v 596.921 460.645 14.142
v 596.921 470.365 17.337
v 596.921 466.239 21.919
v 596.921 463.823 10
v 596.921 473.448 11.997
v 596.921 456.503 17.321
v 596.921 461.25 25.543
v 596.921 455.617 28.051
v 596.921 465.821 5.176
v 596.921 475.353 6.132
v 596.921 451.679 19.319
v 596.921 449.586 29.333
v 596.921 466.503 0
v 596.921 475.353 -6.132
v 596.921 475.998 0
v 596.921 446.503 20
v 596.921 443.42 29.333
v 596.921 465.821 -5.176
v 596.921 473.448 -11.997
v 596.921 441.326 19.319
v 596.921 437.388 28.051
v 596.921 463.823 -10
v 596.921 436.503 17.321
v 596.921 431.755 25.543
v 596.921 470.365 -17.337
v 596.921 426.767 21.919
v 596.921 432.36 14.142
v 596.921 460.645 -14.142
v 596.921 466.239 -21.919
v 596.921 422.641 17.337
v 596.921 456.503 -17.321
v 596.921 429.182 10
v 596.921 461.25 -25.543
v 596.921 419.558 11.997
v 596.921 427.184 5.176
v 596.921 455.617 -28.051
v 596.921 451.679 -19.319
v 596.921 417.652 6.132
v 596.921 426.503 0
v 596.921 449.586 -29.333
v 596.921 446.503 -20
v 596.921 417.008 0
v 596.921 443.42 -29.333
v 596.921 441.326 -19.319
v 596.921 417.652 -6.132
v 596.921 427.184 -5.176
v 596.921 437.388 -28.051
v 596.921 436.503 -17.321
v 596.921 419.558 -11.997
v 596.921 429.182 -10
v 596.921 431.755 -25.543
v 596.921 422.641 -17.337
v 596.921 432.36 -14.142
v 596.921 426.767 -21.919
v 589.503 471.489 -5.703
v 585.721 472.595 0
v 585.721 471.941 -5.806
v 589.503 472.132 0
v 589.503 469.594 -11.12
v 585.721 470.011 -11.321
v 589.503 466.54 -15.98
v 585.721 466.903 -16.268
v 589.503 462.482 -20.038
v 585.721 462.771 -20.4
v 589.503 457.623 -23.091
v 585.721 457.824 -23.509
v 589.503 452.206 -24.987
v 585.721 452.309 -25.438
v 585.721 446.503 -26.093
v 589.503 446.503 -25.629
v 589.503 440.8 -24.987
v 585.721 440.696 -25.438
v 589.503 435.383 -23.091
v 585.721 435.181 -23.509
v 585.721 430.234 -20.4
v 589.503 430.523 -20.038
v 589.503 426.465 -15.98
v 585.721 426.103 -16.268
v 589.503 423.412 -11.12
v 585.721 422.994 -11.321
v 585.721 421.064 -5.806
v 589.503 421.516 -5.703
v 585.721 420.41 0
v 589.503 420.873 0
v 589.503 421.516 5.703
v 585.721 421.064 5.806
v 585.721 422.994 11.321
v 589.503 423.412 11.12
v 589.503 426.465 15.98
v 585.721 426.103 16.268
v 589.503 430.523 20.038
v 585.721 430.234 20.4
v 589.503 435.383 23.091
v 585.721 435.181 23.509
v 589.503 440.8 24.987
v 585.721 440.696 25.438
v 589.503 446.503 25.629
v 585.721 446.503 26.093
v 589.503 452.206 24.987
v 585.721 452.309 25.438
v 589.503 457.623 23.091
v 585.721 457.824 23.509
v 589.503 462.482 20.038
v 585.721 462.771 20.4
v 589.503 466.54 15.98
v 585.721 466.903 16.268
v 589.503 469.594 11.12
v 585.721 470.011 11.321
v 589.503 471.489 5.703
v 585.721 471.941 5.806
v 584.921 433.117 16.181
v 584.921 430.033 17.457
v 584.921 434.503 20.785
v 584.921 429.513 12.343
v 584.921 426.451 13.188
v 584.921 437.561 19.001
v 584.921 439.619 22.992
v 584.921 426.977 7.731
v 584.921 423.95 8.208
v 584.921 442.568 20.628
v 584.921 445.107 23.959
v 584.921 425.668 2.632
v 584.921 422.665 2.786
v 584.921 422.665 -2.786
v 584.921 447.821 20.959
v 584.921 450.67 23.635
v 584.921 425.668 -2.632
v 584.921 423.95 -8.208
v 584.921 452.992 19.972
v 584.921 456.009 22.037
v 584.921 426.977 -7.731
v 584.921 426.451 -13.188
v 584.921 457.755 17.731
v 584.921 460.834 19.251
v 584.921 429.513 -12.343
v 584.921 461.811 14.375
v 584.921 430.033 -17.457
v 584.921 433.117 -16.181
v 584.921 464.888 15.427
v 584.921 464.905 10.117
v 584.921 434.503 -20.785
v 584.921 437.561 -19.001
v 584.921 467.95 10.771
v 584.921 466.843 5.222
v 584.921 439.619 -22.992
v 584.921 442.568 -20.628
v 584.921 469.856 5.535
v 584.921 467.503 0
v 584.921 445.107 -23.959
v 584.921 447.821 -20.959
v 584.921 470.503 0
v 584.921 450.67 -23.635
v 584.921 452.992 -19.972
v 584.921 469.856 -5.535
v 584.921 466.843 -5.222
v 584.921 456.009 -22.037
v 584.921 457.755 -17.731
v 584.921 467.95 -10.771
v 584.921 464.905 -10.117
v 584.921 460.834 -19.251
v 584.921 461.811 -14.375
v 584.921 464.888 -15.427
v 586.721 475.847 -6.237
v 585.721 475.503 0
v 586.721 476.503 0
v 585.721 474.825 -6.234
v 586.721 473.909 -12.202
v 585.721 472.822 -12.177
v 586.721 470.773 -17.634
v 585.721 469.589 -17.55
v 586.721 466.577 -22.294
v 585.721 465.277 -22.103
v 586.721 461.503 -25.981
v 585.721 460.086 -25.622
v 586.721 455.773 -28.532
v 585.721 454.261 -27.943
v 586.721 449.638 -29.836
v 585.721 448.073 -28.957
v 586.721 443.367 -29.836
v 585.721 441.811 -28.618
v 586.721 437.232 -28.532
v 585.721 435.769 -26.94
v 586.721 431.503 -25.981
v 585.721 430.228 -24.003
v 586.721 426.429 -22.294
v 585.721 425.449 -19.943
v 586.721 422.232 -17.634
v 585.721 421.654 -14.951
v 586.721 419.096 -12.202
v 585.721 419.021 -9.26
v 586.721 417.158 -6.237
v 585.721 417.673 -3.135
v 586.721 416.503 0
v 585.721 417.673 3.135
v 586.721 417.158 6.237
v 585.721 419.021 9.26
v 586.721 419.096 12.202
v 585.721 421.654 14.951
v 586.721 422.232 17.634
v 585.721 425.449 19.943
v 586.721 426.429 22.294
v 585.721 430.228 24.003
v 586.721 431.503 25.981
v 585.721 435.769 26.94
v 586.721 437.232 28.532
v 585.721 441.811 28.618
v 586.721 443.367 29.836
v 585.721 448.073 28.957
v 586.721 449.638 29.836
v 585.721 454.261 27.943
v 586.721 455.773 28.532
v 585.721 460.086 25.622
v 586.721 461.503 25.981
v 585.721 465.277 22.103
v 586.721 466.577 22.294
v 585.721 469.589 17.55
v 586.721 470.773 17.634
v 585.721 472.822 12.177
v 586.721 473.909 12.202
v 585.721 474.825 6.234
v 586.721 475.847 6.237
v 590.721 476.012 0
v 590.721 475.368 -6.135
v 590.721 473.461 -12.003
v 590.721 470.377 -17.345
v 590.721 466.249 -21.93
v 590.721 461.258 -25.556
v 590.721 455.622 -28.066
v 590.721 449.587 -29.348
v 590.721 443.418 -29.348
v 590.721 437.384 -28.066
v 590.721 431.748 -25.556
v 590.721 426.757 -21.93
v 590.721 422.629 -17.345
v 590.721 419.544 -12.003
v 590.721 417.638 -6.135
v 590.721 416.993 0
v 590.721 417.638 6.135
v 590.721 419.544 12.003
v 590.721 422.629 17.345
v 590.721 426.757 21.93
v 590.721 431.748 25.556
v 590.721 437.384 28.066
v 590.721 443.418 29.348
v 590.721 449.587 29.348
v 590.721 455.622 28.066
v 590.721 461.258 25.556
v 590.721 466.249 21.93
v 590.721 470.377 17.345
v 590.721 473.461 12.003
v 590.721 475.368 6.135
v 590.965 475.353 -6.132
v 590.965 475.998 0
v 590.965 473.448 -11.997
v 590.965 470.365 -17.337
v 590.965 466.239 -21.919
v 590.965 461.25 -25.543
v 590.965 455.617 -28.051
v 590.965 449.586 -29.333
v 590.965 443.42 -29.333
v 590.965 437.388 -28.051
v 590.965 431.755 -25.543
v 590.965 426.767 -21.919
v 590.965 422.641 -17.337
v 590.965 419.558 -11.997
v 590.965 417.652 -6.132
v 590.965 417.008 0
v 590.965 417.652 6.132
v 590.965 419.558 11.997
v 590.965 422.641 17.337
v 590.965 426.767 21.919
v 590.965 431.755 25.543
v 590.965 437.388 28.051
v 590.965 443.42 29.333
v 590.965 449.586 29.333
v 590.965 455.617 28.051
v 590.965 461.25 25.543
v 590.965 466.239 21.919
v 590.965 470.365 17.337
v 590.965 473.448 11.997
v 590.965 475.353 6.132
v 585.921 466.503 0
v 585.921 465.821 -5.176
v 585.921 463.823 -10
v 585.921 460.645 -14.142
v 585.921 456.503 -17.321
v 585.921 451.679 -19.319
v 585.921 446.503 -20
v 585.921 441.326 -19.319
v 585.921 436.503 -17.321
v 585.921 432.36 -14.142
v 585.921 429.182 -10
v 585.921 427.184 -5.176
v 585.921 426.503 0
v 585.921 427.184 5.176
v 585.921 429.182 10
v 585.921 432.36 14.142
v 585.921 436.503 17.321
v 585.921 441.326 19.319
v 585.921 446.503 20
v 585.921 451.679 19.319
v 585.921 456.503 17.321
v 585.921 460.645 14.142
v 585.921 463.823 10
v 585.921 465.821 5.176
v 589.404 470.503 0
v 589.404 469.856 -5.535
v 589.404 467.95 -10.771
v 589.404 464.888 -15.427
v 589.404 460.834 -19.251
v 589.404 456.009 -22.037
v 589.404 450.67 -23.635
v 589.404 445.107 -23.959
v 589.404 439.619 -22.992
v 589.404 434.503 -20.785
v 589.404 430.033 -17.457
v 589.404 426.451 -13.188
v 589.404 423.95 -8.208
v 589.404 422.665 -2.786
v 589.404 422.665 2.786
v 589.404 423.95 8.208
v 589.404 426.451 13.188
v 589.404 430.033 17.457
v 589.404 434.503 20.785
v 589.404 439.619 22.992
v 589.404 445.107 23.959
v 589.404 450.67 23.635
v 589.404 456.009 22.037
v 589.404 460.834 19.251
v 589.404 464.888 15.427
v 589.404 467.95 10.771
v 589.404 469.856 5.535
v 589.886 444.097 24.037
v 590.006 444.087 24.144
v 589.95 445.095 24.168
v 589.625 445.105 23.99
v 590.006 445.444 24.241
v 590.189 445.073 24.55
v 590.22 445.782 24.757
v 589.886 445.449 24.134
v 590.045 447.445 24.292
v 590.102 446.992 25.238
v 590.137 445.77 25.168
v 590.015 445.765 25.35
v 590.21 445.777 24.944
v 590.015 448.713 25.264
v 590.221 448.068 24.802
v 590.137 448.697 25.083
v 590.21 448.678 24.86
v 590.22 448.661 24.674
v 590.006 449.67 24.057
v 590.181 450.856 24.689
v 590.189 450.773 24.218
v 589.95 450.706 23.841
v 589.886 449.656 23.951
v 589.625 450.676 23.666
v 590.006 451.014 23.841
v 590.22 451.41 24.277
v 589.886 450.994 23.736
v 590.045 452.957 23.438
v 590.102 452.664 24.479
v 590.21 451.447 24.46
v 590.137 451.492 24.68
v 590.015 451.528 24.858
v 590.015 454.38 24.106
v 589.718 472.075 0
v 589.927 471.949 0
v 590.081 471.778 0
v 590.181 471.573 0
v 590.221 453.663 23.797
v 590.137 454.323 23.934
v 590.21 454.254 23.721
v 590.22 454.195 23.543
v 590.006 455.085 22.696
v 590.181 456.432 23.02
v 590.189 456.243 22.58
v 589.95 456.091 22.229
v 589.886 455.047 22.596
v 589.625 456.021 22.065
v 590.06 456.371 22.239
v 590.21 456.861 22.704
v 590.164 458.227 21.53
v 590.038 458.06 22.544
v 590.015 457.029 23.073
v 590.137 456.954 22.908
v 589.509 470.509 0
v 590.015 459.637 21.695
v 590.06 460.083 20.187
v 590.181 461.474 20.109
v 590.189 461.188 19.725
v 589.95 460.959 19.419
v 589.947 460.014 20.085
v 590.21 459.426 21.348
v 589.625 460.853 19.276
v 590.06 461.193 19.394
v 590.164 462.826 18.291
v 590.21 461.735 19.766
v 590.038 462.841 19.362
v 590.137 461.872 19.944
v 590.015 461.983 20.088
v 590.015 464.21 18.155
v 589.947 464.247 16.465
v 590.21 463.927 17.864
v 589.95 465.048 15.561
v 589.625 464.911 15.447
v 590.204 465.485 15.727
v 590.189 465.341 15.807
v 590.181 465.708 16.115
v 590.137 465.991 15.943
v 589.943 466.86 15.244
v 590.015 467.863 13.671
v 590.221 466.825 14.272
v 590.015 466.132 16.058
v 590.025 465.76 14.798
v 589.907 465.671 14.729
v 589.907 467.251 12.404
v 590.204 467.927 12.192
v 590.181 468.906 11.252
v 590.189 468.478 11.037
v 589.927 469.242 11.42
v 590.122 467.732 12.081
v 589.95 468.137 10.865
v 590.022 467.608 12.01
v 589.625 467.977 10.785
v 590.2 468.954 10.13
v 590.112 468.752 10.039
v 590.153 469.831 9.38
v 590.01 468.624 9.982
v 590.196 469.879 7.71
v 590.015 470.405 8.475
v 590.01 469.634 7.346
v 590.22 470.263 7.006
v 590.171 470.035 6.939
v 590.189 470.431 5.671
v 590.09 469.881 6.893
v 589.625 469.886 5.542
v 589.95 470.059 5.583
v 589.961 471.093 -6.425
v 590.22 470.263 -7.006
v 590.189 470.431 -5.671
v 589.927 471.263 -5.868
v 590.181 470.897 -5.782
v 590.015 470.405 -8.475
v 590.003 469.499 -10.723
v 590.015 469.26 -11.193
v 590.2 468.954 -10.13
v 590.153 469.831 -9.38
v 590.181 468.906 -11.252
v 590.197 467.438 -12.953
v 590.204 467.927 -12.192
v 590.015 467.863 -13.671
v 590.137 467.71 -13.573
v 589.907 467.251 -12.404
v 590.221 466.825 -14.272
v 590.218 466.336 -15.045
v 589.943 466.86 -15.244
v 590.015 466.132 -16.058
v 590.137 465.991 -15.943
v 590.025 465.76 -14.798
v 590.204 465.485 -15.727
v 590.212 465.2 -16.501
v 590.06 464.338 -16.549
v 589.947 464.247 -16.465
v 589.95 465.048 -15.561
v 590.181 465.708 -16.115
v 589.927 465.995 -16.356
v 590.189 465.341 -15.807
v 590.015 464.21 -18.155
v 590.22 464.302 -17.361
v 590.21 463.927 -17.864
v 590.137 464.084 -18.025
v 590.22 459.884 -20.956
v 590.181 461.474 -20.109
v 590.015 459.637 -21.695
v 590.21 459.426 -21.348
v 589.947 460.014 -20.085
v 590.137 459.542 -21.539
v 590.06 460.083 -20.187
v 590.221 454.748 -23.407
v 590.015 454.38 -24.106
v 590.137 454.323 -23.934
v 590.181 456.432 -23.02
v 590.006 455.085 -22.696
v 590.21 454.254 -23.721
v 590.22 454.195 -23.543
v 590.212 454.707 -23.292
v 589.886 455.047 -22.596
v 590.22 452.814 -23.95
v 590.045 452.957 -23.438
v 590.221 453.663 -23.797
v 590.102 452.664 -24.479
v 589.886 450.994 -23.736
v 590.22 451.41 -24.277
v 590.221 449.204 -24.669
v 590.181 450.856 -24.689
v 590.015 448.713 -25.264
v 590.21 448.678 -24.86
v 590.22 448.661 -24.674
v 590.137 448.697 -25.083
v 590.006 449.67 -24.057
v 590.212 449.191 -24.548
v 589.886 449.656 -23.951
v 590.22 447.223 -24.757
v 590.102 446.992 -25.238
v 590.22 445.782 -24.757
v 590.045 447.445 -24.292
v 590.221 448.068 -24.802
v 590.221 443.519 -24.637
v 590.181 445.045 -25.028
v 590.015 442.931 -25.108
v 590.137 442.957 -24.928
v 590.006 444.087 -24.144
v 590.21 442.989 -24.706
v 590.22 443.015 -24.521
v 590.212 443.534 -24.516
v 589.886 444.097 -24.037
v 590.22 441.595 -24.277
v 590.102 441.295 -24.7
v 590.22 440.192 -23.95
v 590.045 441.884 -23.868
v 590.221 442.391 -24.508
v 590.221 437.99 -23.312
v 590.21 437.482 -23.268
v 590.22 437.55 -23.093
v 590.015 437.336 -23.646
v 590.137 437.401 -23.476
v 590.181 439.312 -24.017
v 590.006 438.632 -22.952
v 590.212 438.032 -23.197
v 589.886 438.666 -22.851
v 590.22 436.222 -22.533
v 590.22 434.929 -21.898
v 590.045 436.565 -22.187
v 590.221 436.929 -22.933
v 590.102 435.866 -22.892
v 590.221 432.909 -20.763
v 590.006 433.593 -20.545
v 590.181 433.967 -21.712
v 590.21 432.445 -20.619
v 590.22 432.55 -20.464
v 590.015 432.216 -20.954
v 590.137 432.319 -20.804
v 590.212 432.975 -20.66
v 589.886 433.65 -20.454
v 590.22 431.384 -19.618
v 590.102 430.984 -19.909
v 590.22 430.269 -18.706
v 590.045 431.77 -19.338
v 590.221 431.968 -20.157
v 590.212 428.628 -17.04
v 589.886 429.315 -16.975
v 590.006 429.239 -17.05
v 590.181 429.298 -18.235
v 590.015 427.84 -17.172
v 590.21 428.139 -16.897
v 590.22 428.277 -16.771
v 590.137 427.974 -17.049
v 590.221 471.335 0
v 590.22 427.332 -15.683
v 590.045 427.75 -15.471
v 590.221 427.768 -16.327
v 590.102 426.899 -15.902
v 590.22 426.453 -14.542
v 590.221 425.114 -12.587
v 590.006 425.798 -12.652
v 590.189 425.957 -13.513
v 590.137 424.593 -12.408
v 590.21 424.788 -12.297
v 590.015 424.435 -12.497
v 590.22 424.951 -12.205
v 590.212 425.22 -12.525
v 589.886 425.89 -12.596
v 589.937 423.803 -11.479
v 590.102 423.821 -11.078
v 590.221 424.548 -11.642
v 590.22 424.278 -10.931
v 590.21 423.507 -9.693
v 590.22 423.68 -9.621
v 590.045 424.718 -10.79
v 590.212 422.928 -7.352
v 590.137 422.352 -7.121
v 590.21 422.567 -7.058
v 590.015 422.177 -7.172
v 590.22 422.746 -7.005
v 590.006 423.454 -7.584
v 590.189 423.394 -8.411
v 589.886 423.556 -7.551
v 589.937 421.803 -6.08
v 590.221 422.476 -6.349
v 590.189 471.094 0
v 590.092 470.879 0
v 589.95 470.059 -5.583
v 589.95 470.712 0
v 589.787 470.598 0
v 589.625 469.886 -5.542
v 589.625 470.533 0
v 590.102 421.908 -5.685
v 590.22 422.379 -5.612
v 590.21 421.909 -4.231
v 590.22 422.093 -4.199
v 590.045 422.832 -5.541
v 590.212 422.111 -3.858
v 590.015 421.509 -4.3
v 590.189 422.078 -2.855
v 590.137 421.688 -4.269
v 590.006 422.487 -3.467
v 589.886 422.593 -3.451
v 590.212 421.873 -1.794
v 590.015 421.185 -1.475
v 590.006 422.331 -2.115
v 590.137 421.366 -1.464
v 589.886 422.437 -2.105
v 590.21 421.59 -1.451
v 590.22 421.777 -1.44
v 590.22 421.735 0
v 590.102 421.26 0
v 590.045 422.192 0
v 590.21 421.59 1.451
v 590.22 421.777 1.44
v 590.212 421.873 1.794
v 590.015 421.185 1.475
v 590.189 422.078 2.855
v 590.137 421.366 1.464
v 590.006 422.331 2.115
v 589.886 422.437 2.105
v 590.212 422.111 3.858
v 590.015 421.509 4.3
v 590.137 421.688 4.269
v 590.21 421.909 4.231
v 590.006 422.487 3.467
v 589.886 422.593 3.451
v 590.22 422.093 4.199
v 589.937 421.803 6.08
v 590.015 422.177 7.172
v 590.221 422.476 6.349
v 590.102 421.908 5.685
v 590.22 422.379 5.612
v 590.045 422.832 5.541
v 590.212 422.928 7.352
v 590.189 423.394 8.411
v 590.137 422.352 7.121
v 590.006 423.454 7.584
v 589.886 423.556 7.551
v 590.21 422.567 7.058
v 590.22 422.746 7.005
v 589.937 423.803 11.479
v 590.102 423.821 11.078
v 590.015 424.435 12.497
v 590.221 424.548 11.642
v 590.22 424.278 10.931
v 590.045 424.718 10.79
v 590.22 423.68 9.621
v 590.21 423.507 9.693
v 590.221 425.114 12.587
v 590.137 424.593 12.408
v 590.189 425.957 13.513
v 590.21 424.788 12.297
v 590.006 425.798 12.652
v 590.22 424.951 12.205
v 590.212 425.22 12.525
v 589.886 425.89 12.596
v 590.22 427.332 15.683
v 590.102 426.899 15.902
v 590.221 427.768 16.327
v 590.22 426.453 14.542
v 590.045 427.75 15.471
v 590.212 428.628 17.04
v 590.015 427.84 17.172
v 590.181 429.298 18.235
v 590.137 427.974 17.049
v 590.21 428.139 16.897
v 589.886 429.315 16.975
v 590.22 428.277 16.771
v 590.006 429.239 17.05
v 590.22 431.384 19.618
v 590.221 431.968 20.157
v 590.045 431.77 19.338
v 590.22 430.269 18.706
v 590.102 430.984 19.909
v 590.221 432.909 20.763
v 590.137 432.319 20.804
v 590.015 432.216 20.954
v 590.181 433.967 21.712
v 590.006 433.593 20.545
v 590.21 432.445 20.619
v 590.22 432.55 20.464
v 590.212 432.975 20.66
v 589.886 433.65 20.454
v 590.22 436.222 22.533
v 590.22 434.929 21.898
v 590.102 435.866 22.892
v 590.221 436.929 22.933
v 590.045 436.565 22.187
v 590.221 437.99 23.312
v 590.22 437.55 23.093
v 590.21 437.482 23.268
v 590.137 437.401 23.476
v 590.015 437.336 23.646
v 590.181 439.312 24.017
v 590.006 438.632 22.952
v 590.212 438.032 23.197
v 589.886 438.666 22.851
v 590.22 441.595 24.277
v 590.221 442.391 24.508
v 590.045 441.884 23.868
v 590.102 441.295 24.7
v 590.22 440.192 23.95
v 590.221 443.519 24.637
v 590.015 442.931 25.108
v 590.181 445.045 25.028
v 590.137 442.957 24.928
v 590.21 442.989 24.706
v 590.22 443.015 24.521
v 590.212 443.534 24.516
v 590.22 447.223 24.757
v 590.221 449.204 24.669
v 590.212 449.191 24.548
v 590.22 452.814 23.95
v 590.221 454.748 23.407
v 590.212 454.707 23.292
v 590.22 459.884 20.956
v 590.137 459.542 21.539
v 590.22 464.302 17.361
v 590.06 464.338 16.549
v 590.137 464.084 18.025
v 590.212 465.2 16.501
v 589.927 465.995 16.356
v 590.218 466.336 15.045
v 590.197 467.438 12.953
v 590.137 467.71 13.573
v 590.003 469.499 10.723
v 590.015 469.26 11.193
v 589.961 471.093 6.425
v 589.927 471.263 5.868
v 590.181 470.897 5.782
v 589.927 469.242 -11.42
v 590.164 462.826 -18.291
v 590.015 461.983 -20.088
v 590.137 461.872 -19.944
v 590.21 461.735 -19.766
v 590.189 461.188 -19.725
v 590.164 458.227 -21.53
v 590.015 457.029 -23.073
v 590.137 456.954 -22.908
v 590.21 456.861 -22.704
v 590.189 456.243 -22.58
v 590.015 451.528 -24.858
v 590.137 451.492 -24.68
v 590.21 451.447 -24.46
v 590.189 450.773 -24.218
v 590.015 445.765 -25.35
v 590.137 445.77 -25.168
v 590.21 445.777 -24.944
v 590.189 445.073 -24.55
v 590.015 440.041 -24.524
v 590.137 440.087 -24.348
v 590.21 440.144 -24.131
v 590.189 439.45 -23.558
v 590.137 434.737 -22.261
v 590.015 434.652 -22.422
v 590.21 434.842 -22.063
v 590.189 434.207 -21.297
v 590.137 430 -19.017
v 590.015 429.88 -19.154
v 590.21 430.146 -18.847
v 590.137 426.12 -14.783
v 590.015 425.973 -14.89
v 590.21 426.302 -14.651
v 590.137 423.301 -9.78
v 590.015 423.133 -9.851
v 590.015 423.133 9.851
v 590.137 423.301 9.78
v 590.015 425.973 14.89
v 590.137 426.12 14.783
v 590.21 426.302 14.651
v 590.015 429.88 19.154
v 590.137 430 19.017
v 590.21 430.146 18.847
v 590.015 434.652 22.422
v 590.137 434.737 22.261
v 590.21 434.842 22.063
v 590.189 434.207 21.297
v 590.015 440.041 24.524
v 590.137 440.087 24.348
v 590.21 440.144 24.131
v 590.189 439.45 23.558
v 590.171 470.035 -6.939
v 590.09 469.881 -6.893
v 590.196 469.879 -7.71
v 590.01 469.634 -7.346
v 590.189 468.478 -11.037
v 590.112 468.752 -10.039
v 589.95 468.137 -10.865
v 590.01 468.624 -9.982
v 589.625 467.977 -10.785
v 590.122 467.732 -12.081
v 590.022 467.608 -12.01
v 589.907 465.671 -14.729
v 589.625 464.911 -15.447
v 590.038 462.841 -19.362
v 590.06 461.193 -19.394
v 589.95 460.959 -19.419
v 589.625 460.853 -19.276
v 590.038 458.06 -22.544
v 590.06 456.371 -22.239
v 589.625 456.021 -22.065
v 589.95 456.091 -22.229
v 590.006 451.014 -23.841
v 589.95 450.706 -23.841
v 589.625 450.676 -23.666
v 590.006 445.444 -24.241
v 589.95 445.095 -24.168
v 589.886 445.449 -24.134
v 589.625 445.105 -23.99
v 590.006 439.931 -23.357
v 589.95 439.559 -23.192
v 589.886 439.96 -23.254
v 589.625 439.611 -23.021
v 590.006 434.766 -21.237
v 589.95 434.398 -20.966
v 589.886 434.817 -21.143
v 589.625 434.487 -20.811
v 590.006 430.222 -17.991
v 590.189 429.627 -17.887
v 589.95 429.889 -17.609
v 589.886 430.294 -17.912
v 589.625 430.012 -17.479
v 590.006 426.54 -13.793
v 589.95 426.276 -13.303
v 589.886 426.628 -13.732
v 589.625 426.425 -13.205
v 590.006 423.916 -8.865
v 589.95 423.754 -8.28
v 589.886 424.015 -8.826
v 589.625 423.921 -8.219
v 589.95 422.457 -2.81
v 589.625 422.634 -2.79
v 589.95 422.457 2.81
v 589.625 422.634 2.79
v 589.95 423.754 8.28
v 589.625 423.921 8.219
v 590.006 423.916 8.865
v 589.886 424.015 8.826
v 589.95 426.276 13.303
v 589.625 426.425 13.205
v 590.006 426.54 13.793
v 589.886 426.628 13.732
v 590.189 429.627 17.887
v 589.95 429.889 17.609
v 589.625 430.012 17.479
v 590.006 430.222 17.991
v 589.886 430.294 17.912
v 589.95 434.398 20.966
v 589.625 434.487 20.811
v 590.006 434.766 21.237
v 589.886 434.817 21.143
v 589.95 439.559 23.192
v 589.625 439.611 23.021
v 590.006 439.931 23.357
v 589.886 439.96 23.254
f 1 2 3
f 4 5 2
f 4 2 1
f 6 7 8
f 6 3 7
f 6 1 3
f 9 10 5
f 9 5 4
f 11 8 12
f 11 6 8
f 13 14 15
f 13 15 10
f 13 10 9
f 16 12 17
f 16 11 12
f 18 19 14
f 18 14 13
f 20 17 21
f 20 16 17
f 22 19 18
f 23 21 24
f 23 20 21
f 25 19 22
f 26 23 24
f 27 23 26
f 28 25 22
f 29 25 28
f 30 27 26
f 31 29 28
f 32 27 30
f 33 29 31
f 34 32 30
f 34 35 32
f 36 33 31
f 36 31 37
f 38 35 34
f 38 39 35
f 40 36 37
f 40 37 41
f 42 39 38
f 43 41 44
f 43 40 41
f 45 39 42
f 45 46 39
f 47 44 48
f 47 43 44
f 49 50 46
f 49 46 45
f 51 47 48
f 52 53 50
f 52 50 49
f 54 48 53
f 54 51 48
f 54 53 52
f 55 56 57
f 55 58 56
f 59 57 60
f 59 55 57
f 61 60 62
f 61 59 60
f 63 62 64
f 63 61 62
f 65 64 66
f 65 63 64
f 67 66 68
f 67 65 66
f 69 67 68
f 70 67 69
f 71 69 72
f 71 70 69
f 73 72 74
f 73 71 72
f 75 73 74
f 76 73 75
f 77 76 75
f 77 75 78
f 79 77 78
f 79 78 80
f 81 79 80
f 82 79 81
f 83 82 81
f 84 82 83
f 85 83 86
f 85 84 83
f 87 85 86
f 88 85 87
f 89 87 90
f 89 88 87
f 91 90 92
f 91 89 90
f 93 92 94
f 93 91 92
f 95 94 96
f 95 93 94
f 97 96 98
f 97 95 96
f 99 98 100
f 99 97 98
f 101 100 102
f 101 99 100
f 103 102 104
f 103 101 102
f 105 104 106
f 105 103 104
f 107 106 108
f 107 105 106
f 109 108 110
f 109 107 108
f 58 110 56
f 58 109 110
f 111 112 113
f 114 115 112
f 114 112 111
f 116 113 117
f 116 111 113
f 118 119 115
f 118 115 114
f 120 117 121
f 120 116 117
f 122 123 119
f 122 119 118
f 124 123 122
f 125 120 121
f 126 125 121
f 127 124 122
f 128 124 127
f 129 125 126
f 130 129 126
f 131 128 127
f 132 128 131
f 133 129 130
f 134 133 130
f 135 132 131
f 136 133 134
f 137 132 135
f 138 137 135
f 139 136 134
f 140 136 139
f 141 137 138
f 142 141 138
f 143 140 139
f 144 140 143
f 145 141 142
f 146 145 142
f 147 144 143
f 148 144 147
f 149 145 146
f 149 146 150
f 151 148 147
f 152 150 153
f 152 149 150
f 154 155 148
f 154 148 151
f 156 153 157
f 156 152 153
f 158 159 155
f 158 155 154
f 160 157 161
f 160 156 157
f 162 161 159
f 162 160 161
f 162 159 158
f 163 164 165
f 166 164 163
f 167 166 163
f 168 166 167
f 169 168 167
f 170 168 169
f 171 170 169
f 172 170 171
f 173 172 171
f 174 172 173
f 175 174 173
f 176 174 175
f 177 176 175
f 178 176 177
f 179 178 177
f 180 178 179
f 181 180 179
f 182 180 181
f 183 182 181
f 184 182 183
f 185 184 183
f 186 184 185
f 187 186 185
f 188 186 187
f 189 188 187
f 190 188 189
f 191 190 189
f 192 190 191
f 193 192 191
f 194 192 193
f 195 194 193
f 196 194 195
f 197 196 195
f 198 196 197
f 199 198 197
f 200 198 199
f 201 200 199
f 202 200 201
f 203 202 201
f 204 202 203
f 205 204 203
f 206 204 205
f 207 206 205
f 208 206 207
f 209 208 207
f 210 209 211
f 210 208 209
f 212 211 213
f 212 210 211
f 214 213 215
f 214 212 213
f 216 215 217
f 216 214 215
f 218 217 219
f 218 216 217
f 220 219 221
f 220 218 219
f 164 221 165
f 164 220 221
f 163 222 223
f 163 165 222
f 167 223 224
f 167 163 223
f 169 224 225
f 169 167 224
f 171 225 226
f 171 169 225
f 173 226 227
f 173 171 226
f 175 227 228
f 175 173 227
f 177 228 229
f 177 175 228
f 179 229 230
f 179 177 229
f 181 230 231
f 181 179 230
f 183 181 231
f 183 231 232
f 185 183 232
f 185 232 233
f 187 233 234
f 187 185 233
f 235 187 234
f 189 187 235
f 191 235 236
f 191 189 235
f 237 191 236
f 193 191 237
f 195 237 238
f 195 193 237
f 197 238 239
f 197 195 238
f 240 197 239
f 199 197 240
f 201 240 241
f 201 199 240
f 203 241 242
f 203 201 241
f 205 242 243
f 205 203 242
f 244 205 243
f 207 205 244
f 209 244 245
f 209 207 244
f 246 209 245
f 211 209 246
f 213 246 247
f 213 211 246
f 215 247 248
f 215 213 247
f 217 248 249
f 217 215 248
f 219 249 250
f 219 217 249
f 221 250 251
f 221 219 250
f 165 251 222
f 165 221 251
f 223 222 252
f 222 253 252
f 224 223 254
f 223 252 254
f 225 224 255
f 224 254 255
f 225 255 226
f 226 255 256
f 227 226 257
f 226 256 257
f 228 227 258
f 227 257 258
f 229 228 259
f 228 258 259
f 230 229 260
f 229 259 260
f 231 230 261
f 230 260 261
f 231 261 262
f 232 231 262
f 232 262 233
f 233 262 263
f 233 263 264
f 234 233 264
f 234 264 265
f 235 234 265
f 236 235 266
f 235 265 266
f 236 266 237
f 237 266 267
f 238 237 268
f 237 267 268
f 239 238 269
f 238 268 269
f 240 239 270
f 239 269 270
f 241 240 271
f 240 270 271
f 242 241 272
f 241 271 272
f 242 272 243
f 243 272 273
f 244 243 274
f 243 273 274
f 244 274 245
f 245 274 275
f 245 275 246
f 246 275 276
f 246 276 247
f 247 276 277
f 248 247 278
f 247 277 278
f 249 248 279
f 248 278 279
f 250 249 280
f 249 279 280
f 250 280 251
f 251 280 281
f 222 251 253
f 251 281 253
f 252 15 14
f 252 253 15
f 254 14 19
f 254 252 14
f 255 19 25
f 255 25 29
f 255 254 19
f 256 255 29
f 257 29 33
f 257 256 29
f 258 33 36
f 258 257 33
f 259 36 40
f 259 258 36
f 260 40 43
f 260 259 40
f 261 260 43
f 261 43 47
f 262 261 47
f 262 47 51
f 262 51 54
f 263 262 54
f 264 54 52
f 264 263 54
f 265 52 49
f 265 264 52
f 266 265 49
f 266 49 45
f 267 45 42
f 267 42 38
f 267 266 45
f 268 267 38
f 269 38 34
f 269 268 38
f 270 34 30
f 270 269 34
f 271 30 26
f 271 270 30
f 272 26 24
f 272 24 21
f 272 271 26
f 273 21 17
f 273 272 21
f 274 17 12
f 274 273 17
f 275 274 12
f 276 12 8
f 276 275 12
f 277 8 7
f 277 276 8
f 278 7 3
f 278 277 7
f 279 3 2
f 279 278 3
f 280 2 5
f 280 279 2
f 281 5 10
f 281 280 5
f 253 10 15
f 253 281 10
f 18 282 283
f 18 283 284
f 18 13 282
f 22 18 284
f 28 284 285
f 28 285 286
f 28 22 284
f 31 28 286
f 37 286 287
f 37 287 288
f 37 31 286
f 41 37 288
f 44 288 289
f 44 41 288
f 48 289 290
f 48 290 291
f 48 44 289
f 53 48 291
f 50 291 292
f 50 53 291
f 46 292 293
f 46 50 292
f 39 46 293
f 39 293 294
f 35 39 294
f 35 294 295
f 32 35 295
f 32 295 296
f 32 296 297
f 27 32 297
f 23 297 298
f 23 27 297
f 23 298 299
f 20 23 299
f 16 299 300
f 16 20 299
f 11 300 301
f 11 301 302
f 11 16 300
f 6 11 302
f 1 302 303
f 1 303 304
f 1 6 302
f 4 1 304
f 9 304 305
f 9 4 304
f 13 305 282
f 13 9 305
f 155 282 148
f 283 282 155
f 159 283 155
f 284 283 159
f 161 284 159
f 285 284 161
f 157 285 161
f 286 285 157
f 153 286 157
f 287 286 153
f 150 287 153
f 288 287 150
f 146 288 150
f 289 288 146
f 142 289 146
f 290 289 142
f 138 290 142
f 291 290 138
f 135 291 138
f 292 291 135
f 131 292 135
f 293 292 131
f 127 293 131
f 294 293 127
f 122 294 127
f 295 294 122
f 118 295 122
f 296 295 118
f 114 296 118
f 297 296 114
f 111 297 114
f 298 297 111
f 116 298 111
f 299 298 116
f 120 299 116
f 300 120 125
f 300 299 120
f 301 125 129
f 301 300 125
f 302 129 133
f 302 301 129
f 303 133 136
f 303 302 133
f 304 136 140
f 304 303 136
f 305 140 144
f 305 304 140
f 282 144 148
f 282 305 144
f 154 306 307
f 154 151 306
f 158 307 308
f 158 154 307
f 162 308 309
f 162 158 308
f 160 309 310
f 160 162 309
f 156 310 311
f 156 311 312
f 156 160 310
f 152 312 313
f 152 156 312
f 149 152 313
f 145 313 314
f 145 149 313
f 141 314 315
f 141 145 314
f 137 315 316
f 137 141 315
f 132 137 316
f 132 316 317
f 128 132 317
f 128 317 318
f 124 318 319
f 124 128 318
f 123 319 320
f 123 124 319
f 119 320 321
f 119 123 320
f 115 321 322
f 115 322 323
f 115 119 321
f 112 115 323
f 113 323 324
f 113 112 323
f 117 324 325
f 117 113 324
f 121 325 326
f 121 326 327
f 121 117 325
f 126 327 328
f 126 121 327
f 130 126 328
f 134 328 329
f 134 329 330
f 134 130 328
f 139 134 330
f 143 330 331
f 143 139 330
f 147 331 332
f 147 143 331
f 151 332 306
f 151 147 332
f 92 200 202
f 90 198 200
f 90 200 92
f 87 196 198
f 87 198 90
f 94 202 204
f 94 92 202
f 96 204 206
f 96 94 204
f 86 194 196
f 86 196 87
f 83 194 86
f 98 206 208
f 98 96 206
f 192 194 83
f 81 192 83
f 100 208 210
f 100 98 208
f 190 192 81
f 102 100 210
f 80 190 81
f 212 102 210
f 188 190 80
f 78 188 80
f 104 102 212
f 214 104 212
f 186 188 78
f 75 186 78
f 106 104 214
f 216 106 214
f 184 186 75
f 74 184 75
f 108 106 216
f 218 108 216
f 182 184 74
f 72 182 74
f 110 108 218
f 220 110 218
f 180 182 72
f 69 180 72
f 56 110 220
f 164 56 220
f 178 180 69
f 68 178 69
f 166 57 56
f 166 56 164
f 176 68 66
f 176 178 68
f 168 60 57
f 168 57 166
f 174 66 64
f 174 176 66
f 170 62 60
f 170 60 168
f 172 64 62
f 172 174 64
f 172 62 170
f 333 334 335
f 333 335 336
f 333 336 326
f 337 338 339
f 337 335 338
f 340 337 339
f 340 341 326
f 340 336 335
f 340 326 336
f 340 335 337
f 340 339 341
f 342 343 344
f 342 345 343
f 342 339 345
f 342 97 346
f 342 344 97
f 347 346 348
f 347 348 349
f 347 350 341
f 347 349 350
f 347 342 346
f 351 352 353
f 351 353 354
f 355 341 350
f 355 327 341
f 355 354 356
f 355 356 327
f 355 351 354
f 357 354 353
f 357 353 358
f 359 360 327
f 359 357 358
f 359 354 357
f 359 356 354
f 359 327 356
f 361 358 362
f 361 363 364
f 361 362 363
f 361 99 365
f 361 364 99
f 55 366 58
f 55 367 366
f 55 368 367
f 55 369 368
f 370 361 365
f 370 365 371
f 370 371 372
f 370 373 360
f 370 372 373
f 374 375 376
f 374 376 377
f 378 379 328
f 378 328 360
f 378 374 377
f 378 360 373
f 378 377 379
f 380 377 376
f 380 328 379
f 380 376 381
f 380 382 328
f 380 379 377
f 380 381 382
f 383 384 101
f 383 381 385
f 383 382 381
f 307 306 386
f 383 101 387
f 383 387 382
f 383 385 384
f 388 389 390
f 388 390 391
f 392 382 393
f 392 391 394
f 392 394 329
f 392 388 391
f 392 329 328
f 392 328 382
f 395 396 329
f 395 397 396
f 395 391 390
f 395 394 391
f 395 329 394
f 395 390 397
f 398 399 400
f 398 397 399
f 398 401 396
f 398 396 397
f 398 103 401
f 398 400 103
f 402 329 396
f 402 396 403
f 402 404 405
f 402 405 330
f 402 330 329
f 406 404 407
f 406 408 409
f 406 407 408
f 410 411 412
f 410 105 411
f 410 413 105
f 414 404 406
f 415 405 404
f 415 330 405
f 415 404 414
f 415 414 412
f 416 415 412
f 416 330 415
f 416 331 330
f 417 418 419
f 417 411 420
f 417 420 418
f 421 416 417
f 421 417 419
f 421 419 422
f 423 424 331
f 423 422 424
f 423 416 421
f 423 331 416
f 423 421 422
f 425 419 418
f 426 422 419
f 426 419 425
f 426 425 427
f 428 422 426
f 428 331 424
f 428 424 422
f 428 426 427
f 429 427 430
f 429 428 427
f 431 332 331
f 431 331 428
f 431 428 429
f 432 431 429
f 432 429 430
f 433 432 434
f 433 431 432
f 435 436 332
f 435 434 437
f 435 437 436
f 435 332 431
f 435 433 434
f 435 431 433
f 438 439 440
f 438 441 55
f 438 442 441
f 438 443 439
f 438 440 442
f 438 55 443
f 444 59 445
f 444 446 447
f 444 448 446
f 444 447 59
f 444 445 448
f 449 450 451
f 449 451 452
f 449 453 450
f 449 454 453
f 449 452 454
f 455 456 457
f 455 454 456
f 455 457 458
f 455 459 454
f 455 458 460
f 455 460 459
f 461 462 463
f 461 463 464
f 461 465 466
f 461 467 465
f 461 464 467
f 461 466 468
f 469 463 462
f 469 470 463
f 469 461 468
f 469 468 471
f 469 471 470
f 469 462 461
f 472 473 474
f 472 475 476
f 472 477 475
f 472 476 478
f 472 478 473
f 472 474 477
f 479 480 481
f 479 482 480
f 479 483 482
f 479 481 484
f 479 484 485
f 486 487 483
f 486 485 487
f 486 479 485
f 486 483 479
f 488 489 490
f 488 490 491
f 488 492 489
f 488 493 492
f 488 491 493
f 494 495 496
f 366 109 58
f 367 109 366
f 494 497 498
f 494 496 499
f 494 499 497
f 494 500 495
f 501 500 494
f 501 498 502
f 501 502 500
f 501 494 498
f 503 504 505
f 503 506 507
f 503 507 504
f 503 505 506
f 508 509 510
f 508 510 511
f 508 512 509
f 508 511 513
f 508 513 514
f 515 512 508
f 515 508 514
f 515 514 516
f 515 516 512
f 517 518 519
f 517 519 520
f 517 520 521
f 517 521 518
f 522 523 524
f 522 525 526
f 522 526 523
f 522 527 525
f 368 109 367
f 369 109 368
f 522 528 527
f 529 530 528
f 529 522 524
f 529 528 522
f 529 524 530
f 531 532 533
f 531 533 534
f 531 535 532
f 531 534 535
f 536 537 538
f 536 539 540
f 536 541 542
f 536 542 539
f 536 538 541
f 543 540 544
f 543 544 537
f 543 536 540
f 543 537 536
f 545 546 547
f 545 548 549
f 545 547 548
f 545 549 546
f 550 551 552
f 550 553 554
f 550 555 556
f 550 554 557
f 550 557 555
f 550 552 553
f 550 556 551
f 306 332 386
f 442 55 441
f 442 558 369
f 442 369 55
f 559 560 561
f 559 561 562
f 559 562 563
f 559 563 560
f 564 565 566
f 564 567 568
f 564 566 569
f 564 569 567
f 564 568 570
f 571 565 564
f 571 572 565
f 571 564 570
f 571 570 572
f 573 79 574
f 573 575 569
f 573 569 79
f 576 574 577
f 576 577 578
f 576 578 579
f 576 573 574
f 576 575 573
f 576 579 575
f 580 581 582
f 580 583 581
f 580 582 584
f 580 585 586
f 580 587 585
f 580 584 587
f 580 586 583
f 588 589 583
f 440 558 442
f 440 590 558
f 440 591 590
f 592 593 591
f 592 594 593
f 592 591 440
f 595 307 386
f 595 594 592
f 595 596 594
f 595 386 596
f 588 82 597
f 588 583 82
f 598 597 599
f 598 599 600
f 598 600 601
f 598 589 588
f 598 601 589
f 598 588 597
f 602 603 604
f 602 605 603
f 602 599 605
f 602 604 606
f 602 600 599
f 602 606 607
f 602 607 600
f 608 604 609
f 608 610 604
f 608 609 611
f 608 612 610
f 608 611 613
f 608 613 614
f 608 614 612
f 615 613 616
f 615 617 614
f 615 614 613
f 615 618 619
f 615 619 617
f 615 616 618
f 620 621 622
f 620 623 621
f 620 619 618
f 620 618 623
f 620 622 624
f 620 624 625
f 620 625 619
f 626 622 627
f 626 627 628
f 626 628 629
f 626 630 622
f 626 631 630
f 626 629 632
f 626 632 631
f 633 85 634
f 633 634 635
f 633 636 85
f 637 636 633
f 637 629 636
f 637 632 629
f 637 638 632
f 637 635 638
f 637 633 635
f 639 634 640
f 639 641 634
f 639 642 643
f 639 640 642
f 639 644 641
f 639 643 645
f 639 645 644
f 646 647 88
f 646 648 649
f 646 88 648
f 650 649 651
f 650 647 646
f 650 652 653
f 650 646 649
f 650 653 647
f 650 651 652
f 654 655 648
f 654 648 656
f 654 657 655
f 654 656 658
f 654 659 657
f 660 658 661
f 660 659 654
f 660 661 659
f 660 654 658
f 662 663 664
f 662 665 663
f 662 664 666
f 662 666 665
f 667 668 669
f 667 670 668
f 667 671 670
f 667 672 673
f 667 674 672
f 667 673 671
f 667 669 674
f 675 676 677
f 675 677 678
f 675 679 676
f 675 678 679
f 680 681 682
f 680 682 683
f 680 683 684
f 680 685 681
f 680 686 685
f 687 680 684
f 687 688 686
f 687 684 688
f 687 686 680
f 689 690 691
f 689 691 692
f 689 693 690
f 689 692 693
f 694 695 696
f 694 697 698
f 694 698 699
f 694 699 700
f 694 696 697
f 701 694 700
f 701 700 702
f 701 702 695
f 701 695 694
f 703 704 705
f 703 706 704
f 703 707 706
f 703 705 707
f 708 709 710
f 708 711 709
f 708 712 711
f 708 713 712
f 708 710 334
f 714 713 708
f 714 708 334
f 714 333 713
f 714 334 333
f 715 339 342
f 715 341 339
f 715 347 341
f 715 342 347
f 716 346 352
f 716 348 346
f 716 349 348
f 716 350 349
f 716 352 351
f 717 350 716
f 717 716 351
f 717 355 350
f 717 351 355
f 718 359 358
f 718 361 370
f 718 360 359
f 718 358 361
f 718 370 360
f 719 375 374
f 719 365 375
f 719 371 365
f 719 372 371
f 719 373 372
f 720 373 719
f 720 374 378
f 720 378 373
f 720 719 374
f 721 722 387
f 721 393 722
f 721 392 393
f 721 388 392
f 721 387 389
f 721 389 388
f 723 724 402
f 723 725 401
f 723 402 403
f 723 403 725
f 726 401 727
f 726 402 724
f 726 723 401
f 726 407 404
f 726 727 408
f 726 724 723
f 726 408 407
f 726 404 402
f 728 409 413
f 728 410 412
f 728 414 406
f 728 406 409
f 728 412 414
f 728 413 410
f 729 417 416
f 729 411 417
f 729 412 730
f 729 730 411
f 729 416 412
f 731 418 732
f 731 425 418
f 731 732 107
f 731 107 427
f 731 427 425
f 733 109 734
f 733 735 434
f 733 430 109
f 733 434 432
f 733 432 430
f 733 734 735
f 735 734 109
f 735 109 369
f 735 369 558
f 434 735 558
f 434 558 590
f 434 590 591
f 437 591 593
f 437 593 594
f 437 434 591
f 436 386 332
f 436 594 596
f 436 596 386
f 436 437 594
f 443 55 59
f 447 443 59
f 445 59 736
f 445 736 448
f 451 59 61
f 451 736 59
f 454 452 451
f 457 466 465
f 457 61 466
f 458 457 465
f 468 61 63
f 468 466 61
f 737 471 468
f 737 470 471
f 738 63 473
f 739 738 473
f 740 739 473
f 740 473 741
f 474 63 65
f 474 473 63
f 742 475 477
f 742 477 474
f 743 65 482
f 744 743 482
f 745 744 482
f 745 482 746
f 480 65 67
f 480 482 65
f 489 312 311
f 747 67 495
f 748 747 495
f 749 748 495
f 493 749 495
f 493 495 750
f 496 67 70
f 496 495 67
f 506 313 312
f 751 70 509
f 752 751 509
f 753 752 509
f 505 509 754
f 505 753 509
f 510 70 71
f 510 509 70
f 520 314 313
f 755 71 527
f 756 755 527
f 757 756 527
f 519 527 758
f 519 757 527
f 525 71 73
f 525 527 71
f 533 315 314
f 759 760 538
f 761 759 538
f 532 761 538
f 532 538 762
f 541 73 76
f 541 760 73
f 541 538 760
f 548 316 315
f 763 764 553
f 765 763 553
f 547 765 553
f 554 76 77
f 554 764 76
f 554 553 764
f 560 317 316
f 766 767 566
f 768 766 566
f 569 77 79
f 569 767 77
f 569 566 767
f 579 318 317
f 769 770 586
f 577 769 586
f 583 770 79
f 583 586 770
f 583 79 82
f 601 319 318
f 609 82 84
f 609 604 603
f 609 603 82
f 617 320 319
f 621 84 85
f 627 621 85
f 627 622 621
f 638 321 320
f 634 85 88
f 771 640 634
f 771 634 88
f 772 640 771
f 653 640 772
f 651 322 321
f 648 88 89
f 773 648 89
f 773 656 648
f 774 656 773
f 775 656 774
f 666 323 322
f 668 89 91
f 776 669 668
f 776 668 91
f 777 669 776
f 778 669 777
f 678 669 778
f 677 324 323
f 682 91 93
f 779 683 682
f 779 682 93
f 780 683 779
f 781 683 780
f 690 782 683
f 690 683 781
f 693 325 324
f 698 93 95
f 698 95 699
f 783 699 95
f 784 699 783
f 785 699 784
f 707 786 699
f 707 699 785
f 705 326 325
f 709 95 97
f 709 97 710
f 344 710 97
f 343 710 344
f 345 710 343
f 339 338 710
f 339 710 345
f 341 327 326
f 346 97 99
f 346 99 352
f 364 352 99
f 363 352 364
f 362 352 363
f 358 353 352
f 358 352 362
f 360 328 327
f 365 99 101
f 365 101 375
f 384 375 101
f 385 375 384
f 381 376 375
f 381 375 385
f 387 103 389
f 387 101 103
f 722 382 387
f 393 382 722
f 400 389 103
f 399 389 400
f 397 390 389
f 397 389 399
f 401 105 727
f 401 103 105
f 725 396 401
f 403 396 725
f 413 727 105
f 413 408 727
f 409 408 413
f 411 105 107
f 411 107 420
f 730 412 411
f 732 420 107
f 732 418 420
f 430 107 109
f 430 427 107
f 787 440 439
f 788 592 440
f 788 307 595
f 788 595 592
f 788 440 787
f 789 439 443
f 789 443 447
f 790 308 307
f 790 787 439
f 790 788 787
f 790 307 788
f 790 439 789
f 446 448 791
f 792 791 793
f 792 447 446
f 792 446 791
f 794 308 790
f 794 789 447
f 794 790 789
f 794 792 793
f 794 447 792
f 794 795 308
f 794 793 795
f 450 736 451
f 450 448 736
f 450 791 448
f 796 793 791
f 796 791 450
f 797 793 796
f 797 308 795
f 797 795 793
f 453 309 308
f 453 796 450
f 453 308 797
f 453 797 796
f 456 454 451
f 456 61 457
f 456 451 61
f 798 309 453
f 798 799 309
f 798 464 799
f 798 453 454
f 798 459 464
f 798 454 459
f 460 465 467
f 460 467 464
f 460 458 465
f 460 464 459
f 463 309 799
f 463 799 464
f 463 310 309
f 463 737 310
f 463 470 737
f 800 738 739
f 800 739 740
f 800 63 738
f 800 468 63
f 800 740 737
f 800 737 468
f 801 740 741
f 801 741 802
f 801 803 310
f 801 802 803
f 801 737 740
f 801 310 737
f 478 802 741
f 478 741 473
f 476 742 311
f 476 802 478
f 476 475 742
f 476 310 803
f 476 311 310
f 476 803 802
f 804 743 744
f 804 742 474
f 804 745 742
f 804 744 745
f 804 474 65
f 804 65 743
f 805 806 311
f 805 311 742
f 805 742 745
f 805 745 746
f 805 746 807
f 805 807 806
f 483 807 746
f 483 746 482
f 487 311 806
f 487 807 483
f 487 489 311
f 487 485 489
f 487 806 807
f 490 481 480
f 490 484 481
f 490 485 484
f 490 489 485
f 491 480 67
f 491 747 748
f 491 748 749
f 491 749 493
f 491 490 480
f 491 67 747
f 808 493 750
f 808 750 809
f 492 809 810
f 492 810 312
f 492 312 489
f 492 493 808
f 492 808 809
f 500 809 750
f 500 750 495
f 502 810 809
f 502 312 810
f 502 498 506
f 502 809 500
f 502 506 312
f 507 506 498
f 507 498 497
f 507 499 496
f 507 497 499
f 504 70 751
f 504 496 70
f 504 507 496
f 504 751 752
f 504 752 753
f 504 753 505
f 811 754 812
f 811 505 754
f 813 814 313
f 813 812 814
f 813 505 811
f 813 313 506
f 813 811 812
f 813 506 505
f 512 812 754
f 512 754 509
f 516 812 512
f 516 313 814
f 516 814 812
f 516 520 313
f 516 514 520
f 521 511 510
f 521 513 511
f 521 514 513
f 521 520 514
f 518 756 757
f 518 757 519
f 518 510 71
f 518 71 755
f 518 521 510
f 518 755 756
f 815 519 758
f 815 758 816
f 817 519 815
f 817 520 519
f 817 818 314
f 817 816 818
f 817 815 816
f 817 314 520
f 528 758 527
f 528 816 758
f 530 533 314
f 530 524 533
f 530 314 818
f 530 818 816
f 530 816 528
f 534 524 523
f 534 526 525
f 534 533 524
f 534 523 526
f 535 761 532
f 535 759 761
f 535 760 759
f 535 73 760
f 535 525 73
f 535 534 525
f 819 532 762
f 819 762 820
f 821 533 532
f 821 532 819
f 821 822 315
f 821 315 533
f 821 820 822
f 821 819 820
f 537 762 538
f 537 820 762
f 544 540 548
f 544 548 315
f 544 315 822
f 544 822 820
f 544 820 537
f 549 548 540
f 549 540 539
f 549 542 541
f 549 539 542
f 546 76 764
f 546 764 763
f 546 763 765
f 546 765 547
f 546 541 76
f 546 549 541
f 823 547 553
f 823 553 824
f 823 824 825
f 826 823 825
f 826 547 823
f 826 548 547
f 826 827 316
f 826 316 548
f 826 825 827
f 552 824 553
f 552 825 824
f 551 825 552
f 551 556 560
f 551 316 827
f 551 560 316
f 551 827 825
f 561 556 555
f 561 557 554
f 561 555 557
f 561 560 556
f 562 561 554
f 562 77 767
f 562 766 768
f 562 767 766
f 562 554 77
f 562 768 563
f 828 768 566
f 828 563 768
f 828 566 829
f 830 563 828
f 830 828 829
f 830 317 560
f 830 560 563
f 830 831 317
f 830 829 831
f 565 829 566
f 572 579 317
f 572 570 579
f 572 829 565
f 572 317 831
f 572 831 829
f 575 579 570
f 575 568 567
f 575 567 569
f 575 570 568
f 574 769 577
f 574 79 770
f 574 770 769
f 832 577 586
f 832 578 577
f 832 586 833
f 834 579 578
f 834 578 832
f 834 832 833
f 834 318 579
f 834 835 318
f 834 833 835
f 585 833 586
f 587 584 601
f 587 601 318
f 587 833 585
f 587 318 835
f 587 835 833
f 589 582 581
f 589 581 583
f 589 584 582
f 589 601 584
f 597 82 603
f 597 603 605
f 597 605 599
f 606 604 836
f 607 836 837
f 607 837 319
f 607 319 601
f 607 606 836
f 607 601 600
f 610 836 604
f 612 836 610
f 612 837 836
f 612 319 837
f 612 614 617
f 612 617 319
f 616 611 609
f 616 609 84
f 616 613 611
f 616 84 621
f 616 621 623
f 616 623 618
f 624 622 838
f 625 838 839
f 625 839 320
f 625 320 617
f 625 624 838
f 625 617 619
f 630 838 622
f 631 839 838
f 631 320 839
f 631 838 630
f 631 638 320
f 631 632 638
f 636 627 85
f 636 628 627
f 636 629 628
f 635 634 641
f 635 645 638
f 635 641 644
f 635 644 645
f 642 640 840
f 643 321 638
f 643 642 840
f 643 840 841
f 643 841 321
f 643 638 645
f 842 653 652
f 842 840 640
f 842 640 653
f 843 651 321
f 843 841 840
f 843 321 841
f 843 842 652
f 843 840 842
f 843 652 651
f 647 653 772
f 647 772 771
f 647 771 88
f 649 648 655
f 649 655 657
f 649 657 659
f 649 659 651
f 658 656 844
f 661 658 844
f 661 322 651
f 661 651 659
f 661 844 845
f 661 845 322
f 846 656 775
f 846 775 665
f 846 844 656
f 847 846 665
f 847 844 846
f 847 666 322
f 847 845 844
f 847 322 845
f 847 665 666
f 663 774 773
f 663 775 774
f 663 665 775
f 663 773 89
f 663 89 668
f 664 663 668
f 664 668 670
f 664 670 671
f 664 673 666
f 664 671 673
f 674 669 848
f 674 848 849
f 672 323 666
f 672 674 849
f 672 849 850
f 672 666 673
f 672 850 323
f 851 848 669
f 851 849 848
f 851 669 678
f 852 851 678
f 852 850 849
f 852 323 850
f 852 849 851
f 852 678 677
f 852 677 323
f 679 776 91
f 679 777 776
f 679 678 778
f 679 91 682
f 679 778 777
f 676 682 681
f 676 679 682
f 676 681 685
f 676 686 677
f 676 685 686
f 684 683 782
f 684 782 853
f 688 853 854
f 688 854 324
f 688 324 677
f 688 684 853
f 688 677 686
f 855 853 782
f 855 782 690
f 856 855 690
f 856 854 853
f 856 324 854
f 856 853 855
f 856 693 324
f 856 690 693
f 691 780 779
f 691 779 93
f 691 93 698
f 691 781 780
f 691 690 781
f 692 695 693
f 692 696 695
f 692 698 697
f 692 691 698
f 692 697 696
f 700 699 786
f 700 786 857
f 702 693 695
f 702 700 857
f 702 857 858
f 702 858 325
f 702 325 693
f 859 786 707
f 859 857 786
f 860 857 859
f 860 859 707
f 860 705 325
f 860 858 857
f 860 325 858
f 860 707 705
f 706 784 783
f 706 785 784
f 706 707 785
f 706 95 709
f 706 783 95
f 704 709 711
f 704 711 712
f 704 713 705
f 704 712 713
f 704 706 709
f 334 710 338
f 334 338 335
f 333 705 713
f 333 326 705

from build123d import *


with BuildPart() as part:
    # Sketch1 → Revolve1 (revolve)
    with BuildSketch(Plane.XY):
        with BuildLine():
            Line((585.92124879, 466.502634686), (596.92124879, 466.502634686))
            Line((596.92124879, 466.502634686), (596.92124879, 475.997634686))
            Line((596.92124879, 475.997634686), (590.964545007, 475.997634686))
            add(Edge.make_bspline(
                [(590.721291168, 476.012482911), (590.802023582, 476.002590232), (590.883208743, 475.997634686), (590.964545007, 475.997634686)],
                knots=[0, 0, 0, 0, 1, 1, 1, 1], degree=3, weights=[1, 0.998761497, 0.998761497, 1]))
            Line((590.721291168, 476.012482911), (586.72124879, 476.502634686))
            Line((586.72124879, 476.502634686), (585.72124879, 475.502634686))
            Line((585.72124879, 475.502634686), (585.72124879, 472.595252763))
            Line((585.72124879, 472.595252763), (589.50305658, 472.131842722))
            add(Edge.make_bspline(
                [(589.50305658, 472.131842722), (590.947204768, 471.954881648), (590.858559549, 470.502634686), (589.403609649, 470.502634686)],
                knots=[0, 0, 0, 0, 1, 1, 1, 1], degree=3, weights=[1, 0.373951098, 0.373951098, 1]))
            Line((589.403609649, 470.502634686), (584.92124879, 470.502634686))
            Line((584.92124879, 470.502634686), (584.92124879, 467.502634686))
            Line((584.92124879, 467.502634686), (585.92124879, 466.502634686))
        make_face()
    revolve(axis=Axis((596.92124879, 446.502634686, 0), (-1, 0, 0)))


solid = part.part
